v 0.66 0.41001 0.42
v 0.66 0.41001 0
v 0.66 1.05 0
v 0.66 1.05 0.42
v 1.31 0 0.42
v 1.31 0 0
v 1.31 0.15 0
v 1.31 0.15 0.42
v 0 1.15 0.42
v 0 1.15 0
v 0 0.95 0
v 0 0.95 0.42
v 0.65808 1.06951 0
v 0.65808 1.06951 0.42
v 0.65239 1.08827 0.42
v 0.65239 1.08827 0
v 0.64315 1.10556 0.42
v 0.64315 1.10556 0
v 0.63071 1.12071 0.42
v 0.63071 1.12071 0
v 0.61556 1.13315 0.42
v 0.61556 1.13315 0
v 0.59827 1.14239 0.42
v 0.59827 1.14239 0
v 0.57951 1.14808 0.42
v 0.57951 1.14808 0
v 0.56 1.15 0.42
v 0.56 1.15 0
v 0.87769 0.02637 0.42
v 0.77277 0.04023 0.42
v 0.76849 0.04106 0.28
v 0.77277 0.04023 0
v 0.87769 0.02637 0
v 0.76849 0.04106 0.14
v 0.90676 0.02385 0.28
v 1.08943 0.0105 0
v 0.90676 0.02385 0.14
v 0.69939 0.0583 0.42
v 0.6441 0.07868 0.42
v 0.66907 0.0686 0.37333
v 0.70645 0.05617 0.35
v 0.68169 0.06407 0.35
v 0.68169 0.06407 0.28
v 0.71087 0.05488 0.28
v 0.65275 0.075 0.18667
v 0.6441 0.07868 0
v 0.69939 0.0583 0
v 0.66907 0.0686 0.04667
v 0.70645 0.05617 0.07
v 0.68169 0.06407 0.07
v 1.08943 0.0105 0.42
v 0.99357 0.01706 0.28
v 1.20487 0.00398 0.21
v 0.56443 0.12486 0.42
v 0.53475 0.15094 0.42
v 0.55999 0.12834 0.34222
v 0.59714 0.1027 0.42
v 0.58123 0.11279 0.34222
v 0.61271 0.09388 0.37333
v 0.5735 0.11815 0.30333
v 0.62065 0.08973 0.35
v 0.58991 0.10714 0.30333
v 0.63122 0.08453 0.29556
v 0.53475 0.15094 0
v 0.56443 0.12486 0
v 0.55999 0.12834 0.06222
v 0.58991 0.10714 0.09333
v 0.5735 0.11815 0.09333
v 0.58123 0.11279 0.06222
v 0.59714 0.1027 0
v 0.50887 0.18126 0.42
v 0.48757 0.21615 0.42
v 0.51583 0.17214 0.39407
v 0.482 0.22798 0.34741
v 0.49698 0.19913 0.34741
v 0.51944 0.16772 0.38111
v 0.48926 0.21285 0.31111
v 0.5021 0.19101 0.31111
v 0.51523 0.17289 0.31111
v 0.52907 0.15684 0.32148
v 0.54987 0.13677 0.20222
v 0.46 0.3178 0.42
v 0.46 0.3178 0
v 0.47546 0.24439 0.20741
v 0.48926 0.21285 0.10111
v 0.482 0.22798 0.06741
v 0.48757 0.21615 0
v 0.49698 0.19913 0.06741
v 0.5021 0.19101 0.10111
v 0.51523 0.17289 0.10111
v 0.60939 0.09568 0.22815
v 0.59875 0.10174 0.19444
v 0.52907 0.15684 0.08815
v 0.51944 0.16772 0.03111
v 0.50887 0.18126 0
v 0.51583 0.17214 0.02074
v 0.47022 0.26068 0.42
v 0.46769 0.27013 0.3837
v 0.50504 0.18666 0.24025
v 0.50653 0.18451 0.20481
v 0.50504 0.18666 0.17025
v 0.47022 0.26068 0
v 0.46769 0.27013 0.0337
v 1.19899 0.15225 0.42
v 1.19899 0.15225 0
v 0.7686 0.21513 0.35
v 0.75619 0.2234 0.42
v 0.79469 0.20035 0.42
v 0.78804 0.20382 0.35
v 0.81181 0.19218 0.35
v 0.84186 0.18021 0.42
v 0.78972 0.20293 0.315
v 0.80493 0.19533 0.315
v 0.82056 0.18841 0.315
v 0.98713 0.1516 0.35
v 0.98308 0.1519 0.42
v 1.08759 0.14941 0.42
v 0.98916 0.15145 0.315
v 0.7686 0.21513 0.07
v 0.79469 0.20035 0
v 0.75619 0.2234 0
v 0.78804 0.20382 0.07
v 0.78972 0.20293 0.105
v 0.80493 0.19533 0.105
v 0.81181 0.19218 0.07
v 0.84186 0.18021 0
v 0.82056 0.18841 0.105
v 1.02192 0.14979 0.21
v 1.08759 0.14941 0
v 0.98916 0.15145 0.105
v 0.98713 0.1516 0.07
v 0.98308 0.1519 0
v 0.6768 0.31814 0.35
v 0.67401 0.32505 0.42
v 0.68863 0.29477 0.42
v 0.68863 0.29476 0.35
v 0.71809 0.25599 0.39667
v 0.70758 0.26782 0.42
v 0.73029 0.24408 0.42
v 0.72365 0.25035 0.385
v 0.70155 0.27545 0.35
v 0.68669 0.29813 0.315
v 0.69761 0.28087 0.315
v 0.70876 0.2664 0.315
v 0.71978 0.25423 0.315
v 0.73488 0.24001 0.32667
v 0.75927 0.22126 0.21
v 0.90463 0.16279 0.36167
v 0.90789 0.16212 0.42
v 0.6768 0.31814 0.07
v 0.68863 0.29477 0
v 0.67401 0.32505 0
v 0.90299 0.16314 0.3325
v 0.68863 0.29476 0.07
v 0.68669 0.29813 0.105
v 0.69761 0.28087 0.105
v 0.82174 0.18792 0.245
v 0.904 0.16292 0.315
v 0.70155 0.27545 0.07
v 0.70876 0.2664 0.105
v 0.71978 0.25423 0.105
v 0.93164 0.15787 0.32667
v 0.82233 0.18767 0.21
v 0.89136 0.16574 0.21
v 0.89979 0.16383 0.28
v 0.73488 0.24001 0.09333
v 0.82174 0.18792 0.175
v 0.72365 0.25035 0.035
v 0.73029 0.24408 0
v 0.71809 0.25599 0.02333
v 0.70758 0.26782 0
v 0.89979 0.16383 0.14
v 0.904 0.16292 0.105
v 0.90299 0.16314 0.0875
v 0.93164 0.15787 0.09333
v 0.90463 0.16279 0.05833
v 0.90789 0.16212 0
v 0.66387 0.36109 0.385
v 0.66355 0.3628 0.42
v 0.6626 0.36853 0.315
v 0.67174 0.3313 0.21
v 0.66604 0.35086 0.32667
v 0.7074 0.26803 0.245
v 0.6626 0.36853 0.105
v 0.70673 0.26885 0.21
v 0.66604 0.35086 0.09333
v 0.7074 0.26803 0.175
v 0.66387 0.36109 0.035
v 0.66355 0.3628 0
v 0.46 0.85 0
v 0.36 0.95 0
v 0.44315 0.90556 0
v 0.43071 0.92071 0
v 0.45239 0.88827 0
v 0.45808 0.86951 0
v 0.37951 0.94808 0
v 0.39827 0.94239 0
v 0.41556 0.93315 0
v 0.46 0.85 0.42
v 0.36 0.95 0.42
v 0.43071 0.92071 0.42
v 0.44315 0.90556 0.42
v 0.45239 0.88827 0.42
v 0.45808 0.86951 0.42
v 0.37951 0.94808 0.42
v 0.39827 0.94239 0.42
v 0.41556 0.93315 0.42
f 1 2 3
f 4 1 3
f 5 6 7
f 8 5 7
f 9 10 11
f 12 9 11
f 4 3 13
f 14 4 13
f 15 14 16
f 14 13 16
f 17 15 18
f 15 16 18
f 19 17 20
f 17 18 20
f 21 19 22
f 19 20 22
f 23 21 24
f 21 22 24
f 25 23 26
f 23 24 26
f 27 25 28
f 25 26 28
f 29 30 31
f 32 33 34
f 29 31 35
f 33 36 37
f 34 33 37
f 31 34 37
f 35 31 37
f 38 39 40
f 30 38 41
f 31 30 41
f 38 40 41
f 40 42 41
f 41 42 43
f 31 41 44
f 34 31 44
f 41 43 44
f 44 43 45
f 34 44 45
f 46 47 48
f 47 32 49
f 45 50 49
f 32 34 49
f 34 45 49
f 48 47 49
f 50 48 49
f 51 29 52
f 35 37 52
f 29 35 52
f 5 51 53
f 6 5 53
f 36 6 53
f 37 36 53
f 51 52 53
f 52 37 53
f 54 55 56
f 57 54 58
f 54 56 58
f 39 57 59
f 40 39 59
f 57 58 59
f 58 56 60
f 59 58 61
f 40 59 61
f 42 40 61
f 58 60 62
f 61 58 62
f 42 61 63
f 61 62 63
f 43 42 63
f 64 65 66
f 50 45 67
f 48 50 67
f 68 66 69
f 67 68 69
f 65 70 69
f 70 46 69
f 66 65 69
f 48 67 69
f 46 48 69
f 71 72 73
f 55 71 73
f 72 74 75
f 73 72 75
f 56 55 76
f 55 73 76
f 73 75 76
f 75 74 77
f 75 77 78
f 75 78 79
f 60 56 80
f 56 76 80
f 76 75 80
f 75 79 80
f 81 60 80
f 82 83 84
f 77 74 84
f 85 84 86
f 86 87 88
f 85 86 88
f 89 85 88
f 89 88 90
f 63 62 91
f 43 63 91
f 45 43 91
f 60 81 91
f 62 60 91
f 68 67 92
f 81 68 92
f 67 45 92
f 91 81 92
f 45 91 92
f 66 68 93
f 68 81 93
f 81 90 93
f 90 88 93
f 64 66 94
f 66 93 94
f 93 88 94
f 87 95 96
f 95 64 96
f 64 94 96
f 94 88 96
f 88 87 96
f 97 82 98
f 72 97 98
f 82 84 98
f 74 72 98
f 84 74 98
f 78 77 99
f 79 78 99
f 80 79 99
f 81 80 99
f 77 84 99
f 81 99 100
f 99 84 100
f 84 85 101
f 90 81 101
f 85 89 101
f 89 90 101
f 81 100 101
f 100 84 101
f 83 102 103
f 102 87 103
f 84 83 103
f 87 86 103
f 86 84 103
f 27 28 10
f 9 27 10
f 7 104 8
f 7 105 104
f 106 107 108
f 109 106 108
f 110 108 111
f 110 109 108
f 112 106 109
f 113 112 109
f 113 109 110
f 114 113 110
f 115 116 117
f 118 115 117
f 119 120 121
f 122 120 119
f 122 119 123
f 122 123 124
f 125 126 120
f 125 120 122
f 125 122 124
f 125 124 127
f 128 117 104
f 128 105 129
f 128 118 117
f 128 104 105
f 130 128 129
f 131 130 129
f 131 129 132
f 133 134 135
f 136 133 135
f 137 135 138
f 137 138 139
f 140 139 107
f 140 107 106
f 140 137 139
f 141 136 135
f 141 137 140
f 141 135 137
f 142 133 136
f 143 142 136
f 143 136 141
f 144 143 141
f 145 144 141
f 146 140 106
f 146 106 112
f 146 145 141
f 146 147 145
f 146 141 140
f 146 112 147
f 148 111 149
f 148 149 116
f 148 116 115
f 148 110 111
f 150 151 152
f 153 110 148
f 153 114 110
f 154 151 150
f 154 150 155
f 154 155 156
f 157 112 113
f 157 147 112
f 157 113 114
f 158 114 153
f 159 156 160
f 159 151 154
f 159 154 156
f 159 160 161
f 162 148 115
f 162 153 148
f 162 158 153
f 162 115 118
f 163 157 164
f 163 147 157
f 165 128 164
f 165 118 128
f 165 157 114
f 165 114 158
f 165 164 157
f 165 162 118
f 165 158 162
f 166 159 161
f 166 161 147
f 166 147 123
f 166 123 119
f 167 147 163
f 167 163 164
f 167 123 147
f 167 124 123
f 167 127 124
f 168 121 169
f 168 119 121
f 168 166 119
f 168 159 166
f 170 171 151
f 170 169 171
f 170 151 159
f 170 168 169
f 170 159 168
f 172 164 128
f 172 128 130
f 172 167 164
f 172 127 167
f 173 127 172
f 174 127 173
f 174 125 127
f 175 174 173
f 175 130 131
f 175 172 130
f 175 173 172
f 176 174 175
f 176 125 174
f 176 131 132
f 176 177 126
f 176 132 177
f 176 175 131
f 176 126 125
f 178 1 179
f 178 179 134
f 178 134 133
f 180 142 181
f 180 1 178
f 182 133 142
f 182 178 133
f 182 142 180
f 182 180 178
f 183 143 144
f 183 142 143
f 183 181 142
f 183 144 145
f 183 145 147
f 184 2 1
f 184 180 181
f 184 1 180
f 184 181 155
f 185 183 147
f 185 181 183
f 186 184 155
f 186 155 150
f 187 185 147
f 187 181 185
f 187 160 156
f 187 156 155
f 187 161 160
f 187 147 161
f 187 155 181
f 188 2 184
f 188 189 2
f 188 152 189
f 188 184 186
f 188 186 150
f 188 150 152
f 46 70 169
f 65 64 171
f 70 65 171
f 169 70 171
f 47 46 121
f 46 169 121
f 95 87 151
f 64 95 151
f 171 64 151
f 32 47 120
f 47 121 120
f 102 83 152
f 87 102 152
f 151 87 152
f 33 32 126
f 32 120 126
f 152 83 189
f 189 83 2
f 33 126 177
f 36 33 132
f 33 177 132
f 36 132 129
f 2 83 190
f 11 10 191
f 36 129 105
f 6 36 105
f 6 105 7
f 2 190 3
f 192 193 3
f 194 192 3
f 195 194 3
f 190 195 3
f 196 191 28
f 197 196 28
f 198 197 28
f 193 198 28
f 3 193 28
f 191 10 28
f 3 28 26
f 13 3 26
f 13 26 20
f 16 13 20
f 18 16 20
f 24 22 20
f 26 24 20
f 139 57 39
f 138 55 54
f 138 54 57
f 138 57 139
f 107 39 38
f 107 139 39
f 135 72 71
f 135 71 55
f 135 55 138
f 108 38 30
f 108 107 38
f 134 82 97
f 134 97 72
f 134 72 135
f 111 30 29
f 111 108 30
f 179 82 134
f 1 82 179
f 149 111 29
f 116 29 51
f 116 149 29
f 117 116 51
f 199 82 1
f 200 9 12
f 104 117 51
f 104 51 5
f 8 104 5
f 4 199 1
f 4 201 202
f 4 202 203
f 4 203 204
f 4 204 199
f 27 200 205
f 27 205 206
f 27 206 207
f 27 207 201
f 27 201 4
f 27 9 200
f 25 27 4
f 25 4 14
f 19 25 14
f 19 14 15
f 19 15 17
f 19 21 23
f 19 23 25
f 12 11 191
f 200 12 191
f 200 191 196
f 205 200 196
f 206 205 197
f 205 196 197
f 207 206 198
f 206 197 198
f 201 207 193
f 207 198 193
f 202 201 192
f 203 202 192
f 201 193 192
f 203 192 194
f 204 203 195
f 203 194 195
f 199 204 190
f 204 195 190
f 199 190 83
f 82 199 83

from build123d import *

# Parameters (mm, degrees)
BOSS_EXTRUDE1_DEPTH = 0.42


with BuildPart() as part:
    # Sketch1 → Boss-Extrude1 (new body)
    with BuildSketch(Plane.XY):
        with BuildLine():
            Line((0, 1.15), (0, 0.95))
            Line((0, 0.95), (0.36, 0.95))
            ThreePointArc((0.36, 0.95), (0.430710678, 0.920710678), (0.46, 0.85))
            Line((0.46, 0.85), (0.46, 0.317796194))
            add(Edge.make_bspline(
                [(0.46, 0.317796194), (0.474880606, 0.134638656), (0.690978233, 0.044183094), (0.947584463, 0.019140746), (1.192436941, 0.002848408), (1.31, 0)],
                knots=[0, 0, 0, 0, 0.373086953, 0.499546573, 0.782662078, 0.782662078, 0.782662078, 0.782662078], degree=3))
            Line((1.31, 0), (1.31, 0.15))
            add(Edge.make_bspline(
                [(0.66, 0.410010409), (0.657020771, 0.26558954), (0.908391178, 0.109635419), (1.170992072, 0.160633721), (1.31, 0.15)],
                knots=[0, 0, 0, 0, 0.461377354, 1, 1, 1, 1], degree=3))
            Line((0.66, 0.410010409), (0.66, 1.05))
            ThreePointArc((0.66, 1.05), (0.630710678, 1.120710678), (0.56, 1.15))
            Line((0.56, 1.15), (0, 1.15))
        make_face()
    extrude(amount=BOSS_EXTRUDE1_DEPTH)


solid = part.part
